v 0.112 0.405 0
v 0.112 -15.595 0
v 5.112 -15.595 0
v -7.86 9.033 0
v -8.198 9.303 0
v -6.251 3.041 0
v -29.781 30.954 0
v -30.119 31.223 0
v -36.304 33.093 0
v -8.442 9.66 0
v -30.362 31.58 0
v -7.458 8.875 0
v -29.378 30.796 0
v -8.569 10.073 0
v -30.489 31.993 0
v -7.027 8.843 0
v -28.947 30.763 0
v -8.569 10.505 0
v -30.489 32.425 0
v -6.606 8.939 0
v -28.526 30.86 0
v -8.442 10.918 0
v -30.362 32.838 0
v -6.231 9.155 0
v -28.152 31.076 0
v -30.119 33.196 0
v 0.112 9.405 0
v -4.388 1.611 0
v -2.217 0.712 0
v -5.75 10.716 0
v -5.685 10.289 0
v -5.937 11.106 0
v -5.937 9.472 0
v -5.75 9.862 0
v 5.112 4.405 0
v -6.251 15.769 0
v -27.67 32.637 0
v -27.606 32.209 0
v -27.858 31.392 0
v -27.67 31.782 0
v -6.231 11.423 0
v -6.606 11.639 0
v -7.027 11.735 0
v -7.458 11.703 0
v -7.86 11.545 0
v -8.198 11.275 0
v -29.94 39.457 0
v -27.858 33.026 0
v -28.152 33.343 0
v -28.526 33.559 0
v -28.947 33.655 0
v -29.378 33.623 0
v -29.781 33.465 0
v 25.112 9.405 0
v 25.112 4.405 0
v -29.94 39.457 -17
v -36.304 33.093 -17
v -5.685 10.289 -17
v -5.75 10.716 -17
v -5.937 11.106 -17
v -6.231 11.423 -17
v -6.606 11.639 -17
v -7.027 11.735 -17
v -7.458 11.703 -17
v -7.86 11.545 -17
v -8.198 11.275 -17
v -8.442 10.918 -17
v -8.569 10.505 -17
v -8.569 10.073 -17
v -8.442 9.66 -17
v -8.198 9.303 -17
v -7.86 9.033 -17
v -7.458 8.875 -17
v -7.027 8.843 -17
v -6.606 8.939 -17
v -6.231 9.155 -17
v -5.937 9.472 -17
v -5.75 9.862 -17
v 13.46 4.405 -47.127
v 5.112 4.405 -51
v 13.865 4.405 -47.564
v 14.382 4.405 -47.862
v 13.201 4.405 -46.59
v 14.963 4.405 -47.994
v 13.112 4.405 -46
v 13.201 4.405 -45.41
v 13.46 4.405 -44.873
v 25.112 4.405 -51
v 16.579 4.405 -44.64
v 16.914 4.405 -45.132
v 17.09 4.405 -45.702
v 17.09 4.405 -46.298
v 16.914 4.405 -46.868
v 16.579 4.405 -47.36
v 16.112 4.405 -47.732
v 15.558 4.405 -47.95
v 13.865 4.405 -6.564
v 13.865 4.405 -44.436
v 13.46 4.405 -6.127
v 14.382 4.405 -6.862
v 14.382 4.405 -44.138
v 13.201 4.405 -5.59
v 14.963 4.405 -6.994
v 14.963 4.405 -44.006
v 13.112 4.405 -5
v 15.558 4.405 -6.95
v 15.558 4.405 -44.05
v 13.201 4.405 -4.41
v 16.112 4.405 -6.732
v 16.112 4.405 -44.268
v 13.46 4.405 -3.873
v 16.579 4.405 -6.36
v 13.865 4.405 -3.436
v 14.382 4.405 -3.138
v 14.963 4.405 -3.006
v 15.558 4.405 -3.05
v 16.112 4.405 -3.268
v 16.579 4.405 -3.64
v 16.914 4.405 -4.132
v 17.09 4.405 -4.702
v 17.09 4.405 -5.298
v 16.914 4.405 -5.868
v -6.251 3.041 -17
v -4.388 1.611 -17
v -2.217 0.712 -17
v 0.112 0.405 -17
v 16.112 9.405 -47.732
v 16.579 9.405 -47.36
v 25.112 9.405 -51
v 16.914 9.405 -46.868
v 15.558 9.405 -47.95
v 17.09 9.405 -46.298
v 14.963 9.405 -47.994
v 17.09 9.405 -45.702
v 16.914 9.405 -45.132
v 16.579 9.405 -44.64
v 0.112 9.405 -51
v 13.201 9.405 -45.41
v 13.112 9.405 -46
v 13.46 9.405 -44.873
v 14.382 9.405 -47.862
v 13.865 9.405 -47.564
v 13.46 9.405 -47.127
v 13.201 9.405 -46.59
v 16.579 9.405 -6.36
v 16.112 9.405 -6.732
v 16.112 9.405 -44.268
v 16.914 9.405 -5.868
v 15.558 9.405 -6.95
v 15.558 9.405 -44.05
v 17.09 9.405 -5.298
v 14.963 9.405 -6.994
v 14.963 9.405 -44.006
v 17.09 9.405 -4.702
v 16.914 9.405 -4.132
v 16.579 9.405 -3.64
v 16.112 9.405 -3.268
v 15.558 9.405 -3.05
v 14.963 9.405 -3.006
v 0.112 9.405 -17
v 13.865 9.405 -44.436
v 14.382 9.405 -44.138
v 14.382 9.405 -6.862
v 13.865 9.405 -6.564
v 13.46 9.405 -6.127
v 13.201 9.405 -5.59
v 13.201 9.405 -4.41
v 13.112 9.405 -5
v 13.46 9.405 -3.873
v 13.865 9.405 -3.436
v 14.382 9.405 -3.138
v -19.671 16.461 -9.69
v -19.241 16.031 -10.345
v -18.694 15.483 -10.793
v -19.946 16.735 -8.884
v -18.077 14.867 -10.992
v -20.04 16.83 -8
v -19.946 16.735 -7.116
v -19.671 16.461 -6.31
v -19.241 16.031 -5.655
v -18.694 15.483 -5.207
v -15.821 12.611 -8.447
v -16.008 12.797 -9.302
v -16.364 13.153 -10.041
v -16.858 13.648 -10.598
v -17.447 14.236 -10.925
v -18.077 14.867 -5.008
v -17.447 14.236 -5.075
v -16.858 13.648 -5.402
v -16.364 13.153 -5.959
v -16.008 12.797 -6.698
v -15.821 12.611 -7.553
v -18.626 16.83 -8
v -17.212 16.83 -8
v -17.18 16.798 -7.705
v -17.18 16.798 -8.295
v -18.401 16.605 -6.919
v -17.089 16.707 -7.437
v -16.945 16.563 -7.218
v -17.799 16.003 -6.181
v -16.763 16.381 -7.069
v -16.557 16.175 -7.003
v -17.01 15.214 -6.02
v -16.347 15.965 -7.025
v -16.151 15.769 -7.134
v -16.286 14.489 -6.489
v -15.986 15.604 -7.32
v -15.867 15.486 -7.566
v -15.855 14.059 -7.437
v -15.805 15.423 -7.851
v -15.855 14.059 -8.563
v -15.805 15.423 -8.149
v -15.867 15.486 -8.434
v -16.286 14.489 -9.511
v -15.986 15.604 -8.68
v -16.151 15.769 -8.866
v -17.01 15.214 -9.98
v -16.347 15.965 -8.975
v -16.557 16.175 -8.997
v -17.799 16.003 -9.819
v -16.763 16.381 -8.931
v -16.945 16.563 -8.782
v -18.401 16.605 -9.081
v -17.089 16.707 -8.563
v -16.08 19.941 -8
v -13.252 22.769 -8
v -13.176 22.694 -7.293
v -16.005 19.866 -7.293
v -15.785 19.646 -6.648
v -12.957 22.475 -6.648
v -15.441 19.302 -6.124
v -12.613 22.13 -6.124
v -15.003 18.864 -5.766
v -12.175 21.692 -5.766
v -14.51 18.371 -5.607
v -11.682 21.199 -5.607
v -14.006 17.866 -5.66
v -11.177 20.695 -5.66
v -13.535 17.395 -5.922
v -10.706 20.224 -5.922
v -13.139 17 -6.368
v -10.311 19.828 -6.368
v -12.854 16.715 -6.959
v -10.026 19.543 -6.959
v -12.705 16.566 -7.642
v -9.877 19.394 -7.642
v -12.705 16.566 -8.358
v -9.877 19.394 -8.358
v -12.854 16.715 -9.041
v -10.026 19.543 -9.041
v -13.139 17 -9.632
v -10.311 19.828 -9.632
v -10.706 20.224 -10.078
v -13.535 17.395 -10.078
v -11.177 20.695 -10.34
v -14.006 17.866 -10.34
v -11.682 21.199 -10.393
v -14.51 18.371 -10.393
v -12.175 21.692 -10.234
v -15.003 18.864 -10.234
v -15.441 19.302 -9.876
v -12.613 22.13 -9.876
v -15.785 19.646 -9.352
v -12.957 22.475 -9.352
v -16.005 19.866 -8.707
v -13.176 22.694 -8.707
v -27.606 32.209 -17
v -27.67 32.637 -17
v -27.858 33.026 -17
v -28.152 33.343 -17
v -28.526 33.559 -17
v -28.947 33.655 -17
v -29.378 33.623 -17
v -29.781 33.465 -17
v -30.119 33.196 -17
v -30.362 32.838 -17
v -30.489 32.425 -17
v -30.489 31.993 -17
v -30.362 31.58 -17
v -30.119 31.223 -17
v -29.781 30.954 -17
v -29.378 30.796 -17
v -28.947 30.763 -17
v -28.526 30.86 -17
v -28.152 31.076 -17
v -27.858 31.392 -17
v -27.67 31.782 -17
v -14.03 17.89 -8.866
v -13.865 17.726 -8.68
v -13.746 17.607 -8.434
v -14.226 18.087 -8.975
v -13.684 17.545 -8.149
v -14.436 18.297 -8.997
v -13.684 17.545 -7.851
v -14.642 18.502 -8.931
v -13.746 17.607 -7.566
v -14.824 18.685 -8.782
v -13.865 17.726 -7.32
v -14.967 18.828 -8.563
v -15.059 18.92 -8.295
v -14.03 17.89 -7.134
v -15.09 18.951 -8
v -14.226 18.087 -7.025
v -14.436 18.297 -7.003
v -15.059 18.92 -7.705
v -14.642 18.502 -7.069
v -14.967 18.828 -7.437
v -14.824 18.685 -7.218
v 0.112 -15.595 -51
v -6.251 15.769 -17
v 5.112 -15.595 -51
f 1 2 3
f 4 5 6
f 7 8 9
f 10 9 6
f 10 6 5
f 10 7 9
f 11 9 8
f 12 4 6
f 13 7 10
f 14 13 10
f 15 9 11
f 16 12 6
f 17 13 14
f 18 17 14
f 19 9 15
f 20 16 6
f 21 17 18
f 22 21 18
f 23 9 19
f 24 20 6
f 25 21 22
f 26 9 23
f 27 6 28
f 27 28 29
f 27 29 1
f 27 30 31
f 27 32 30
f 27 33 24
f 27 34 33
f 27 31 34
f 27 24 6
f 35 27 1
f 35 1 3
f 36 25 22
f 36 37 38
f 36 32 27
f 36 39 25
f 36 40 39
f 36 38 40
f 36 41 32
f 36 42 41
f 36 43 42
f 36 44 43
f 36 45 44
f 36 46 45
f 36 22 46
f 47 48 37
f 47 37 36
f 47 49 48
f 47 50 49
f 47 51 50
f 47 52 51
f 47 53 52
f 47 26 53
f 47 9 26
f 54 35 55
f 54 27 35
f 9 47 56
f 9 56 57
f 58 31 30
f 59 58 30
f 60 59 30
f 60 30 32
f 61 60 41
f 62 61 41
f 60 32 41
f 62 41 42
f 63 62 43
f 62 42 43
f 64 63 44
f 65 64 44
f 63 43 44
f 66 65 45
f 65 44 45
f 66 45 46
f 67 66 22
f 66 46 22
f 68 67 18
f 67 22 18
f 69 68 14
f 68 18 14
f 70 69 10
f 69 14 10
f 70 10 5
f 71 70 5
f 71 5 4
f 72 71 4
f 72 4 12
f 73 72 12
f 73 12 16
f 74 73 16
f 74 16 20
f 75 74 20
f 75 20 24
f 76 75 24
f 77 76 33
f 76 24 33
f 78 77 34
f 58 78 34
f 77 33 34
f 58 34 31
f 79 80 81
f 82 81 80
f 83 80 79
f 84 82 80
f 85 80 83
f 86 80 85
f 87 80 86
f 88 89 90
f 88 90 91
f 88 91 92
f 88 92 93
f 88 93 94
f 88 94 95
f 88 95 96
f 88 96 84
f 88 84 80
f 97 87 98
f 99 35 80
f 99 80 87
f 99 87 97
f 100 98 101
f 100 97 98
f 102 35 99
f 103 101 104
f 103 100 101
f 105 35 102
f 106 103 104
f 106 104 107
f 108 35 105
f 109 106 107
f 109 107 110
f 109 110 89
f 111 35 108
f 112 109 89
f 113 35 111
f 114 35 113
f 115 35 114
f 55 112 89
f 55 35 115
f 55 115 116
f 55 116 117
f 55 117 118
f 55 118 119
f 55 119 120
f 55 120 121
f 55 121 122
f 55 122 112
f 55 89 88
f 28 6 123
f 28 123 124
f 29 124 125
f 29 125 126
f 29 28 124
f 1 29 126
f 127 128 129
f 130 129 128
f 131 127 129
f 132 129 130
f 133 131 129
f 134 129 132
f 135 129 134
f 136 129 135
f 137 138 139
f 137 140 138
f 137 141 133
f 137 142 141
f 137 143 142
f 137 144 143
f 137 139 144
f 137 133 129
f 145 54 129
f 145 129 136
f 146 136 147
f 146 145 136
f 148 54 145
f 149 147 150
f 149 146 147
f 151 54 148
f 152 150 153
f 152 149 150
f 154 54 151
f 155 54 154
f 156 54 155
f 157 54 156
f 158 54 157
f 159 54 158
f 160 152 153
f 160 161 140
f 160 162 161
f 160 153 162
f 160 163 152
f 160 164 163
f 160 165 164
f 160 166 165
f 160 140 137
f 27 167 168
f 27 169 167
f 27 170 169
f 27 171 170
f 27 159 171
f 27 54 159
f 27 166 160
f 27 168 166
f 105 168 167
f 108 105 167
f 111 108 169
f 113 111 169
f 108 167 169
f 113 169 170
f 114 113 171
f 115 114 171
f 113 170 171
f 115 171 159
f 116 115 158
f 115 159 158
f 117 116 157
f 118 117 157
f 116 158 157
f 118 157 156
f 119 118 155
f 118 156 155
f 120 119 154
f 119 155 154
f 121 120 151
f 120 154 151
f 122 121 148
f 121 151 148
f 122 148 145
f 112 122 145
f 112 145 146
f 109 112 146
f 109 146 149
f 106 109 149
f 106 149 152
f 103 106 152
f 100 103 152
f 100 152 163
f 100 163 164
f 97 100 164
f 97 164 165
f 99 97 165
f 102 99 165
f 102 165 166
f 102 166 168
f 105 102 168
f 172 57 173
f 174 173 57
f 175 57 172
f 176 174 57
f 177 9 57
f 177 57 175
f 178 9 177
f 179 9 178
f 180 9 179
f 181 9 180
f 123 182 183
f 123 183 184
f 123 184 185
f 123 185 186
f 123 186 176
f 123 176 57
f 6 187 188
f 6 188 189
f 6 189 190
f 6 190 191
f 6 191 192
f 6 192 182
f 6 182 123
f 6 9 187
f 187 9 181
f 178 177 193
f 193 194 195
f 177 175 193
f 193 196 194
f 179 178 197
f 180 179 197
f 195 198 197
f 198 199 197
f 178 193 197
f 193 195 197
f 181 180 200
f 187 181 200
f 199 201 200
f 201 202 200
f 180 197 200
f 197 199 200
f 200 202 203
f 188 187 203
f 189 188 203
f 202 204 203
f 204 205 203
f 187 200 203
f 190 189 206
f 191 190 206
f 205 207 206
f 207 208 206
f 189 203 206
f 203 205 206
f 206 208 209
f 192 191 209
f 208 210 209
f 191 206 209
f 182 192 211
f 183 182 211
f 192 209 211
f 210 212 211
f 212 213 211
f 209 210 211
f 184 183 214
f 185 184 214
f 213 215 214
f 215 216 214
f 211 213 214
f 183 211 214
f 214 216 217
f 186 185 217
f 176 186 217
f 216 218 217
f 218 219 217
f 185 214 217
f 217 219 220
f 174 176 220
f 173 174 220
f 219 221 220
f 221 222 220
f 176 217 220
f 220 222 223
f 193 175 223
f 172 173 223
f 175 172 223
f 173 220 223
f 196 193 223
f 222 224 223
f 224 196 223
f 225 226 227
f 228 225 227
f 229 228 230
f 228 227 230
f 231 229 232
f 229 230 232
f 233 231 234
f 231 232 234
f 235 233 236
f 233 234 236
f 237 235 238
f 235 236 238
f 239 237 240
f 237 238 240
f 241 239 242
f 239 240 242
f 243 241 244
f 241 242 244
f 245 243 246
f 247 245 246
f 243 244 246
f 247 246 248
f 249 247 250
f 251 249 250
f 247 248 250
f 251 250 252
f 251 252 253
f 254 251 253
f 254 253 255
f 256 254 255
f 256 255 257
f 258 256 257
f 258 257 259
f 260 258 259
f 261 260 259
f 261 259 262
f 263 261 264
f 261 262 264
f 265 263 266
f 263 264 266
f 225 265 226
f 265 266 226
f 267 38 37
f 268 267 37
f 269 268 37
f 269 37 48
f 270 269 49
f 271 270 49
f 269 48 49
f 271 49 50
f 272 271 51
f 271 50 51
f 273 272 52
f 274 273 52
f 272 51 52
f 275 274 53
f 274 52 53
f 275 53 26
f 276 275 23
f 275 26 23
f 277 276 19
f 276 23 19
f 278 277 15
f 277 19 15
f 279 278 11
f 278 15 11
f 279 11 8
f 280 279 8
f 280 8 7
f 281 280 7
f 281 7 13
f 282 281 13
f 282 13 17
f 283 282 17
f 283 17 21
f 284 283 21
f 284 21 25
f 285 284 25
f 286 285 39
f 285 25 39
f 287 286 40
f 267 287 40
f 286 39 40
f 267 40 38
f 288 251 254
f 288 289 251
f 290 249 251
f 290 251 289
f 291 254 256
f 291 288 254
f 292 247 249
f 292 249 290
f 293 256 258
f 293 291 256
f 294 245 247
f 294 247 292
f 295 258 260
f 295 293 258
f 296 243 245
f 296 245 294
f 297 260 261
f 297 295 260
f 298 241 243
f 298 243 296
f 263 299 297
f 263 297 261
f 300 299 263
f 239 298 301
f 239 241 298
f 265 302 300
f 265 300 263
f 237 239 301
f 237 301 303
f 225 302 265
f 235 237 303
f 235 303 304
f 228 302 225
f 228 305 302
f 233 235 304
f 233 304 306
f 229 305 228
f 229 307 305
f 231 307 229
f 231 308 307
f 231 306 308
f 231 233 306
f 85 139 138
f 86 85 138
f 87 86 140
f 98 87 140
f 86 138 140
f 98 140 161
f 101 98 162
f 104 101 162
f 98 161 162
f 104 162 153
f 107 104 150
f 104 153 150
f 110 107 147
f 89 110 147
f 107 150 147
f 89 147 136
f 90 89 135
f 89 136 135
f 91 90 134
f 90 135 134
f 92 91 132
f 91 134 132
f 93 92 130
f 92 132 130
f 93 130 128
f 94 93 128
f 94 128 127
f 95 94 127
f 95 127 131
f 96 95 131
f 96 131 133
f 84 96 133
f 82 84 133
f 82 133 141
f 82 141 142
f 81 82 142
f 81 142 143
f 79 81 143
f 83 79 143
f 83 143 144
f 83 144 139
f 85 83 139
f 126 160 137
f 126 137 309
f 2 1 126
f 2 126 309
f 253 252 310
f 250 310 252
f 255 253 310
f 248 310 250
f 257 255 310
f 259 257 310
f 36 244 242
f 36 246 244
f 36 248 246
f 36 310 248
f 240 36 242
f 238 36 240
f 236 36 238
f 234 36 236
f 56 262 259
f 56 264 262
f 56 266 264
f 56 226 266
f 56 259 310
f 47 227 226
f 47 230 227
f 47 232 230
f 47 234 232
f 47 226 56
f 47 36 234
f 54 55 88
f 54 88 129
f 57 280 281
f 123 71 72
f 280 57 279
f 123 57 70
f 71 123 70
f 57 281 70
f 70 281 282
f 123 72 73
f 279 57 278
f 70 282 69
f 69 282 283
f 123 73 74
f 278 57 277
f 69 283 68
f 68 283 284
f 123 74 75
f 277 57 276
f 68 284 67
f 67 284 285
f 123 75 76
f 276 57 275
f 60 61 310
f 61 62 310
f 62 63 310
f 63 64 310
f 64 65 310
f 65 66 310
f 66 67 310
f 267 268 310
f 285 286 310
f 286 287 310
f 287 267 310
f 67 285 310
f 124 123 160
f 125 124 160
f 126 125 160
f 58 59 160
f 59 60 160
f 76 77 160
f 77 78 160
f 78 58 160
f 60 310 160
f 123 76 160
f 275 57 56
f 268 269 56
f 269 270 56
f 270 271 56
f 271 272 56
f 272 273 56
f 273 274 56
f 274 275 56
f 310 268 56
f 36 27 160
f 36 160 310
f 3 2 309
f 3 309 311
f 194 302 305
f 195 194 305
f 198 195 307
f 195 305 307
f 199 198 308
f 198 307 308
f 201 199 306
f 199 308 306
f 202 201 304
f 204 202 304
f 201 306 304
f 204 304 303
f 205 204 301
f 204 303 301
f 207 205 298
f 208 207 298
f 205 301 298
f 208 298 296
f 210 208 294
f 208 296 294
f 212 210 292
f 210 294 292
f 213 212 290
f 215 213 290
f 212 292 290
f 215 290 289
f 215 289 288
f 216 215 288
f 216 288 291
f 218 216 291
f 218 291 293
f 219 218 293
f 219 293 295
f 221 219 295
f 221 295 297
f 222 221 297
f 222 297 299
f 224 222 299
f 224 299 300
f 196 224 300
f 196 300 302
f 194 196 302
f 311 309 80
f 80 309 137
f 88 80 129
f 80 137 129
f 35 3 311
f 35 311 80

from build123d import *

# Parameters (mm, degrees)
F0_R     = 1.45
F1_DEPTH = 17
F2_DEPTH = 51
F3_R     = 1
F4_DEPTH = 43.4286695297
F3_R_2   = 2.4
F5_DEPTH = 4
F6_SIZE  = 2
F7_R     = 2
F8_DEPTH = 25.001


# Not quite as in the source:
# - a feature names something its author has since deleted; it is built from what else it names


with BuildPart() as f1:
    # F0 (on Top) → F1 (new body)
    with BuildSketch(Plane.XY):
        with BuildLine():
            ThreePointArc((-6.2514946472, 3.0411327703), (-8.8875336165, 9.4050938009), (-6.2514946472, 15.7690548316))
            Line((-6.2514946472, 15.7690548316), (-29.9395718169, 39.4571320014))
            Line((-29.9395718169, 39.4571320014), (-36.3035328476, 33.0931709707))
            Line((-36.3035328476, 33.0931709707), (-6.2514946472, 3.0411327703))
        make_face()
        with Locations((-29.0556883405, 32.2092874942)):
            Circle(F0_R, mode=Mode.SUBTRACT)
        with BuildLine():
            Line((-6.2514946472, 3.0411327703), (0.1124663835, 9.4050938009))
            Line((0.1124663835, 9.4050938009), (-6.2514946472, 15.7690548316))
            ThreePointArc((-6.2514946472, 15.7690548316), (-8.8875336165, 9.4050938009), (-6.2514946472, 3.0411327703))
        make_face()
        with Locations((-7.1353781237, 10.2889772774)):
            Circle(F0_R, mode=Mode.SUBTRACT)
        with BuildLine():
            Line((0.1124663835, 0.4050938009), (0.1124663835, 9.4050938009))
            Line((0.1124663835, 9.4050938009), (-6.2514946472, 3.0411327703))
            ThreePointArc((-6.2514946472, 3.0411327703), (-3.3316845078, 1.0901780083), (0.1124663835, 0.4050938009))
        make_face()
    extrude(amount=-F1_DEPTH)

    # F0 (on Top) → F2 (join)
    with BuildSketch(Plane.XY):
        with BuildLine():
            ThreePointArc((5.1124663835, 1.9217790274), (2.7249524636, 0.7926077208), (0.1124663835, 0.4050938009))
            Line((0.1124663835, 0.4050938009), (0.1124663835, -15.5949061991))
            Line((0.1124663835, -15.5949061991), (5.1124663835, -15.5949061991))
            Line((5.1124663835, -15.5949061991), (5.1124663835, 1.9217790274))
        make_face()
        with BuildLine():
            Line((9.1124663835, 9.4050938009), (0.1124663835, 9.4050938009))
            Line((0.1124663835, 9.4050938009), (0.1124663835, 0.4050938009))
            ThreePointArc((0.1124663835, 0.4050938009), (2.7249524636, 0.7926077208), (5.1124663835, 1.9217790274))
            Line((5.1124663835, 1.9217790274), (5.1124663835, 4.4050938009))
            Line((5.1124663835, 4.4050938009), (7.595781157, 4.4050938009))
            ThreePointArc((7.595781157, 4.4050938009), (8.7249524636, 6.7926077208), (9.1124663835, 9.4050938009))
        make_face()
        with BuildLine():
            Line((25.1124663835, 9.4050938009), (9.1124663835, 9.4050938009))
            ThreePointArc((9.1124663835, 9.4050938009), (8.7249524636, 6.7926077208), (7.595781157, 4.4050938009))
            Line((7.595781157, 4.4050938009), (25.1124663835, 4.4050938009))
            Line((25.1124663835, 4.4050938009), (25.1124663835, 9.4050938009))
        make_face()
    extrude(amount=-F2_DEPTH)

    # F3 (on face) → F4 (cut, through all)
    with BuildSketch(Plane(origin=(4.7587800922, 4.7587800922, 0), x_dir=(-0.7071067812, 0.7071067812, 0), z_dir=(0.7071067812, 0.7071067812, 0))):
        with Locations((23.0708798619, -8)):
            Circle(F3_R)
    extrude(amount=-F4_DEPTH, mode=Mode.SUBTRACT)

    # F3 (on face) → F5 (cut)
    with BuildSketch(Plane(origin=(4.7587800922, 4.7587800922, 0), x_dir=(-0.7071067812, 0.7071067812, 0), z_dir=(0.7071067812, 0.7071067812, 0))):
        with Locations((23.0708798619, -8)):
            Circle(F3_R_2)
        with Locations((23.0708798619, -8)):
            Circle(F3_R, mode=Mode.SUBTRACT)
    extrude(amount=-F5_DEPTH, mode=Mode.SUBTRACT)

    # F6
    f6_edges = [f1.edges().sort_by_distance(p)[0] for p in [
        (-17.21165, 14.001288, -8),
    ]]
    chamfer(f6_edges, length=F6_SIZE)

    # F7 (on face) → F8 (cut, through all)
    with BuildSketch(Plane(origin=(0, 9.4050938009, 0), x_dir=(-1, 0, 0), z_dir=(0, 1, 0))):
        with Locations((-15.1124663835, -5)):
            Circle(F7_R)
        with Locations((-15.1124663835, -46)):
            Circle(F7_R)
    extrude(amount=-F8_DEPTH, mode=Mode.SUBTRACT)


solid = f1.part
